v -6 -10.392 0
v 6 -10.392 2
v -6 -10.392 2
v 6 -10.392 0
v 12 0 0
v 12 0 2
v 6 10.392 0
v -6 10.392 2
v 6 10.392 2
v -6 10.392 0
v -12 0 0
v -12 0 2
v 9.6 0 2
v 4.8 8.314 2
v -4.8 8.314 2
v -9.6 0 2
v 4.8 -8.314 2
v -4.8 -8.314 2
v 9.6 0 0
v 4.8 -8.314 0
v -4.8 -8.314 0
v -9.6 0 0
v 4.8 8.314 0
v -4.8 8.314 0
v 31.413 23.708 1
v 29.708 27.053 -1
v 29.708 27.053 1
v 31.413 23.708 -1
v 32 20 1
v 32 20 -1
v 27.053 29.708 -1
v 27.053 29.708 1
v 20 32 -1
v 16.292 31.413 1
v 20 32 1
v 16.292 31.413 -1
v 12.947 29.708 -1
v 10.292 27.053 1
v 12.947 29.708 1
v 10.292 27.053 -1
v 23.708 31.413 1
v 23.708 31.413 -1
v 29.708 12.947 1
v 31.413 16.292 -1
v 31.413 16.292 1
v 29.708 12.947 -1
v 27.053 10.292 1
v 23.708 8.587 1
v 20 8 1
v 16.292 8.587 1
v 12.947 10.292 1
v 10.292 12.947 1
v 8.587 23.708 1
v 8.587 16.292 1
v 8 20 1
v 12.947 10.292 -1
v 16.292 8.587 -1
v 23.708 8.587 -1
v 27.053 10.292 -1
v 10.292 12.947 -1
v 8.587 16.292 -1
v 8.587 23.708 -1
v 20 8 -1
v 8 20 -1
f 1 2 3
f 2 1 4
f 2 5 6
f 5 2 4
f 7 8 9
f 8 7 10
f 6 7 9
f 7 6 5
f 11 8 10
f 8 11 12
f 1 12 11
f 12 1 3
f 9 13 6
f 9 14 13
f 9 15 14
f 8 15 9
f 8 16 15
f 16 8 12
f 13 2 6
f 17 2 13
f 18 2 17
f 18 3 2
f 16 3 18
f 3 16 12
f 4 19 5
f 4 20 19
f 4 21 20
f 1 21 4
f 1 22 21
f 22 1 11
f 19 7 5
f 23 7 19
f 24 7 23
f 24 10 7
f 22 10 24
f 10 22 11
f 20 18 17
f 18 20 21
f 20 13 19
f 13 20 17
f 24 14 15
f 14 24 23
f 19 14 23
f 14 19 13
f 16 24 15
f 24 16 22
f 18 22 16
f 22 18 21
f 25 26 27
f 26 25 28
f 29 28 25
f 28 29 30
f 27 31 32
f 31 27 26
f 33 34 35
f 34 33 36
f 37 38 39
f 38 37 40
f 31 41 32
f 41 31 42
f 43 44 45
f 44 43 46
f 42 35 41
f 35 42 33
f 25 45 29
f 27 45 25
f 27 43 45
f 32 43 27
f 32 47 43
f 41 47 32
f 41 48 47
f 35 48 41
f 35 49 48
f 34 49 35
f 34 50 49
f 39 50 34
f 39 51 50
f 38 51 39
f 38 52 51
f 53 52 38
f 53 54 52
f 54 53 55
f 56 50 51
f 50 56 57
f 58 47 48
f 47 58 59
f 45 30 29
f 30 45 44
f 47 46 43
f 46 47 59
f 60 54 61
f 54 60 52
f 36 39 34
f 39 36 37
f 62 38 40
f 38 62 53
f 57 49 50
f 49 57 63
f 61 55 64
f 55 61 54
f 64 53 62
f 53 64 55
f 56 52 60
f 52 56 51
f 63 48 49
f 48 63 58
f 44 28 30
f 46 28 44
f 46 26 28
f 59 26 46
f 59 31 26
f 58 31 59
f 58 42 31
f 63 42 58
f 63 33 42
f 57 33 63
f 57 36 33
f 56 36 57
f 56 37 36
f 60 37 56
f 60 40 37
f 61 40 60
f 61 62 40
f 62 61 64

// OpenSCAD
layers = 1;
hexagonsize = 1;
layerotation = 0;

module hexagon() {
    $fn = 6;
    difference() {
        cylinder(h = 2, r = 12);
        scale([0.8,0.8,1])
        cylinder(h=2, r=12);
    }
}

hexagon();

$fn = 20;
translate([20,20,0])
    cylinder(h=2, r=12,center=true);
